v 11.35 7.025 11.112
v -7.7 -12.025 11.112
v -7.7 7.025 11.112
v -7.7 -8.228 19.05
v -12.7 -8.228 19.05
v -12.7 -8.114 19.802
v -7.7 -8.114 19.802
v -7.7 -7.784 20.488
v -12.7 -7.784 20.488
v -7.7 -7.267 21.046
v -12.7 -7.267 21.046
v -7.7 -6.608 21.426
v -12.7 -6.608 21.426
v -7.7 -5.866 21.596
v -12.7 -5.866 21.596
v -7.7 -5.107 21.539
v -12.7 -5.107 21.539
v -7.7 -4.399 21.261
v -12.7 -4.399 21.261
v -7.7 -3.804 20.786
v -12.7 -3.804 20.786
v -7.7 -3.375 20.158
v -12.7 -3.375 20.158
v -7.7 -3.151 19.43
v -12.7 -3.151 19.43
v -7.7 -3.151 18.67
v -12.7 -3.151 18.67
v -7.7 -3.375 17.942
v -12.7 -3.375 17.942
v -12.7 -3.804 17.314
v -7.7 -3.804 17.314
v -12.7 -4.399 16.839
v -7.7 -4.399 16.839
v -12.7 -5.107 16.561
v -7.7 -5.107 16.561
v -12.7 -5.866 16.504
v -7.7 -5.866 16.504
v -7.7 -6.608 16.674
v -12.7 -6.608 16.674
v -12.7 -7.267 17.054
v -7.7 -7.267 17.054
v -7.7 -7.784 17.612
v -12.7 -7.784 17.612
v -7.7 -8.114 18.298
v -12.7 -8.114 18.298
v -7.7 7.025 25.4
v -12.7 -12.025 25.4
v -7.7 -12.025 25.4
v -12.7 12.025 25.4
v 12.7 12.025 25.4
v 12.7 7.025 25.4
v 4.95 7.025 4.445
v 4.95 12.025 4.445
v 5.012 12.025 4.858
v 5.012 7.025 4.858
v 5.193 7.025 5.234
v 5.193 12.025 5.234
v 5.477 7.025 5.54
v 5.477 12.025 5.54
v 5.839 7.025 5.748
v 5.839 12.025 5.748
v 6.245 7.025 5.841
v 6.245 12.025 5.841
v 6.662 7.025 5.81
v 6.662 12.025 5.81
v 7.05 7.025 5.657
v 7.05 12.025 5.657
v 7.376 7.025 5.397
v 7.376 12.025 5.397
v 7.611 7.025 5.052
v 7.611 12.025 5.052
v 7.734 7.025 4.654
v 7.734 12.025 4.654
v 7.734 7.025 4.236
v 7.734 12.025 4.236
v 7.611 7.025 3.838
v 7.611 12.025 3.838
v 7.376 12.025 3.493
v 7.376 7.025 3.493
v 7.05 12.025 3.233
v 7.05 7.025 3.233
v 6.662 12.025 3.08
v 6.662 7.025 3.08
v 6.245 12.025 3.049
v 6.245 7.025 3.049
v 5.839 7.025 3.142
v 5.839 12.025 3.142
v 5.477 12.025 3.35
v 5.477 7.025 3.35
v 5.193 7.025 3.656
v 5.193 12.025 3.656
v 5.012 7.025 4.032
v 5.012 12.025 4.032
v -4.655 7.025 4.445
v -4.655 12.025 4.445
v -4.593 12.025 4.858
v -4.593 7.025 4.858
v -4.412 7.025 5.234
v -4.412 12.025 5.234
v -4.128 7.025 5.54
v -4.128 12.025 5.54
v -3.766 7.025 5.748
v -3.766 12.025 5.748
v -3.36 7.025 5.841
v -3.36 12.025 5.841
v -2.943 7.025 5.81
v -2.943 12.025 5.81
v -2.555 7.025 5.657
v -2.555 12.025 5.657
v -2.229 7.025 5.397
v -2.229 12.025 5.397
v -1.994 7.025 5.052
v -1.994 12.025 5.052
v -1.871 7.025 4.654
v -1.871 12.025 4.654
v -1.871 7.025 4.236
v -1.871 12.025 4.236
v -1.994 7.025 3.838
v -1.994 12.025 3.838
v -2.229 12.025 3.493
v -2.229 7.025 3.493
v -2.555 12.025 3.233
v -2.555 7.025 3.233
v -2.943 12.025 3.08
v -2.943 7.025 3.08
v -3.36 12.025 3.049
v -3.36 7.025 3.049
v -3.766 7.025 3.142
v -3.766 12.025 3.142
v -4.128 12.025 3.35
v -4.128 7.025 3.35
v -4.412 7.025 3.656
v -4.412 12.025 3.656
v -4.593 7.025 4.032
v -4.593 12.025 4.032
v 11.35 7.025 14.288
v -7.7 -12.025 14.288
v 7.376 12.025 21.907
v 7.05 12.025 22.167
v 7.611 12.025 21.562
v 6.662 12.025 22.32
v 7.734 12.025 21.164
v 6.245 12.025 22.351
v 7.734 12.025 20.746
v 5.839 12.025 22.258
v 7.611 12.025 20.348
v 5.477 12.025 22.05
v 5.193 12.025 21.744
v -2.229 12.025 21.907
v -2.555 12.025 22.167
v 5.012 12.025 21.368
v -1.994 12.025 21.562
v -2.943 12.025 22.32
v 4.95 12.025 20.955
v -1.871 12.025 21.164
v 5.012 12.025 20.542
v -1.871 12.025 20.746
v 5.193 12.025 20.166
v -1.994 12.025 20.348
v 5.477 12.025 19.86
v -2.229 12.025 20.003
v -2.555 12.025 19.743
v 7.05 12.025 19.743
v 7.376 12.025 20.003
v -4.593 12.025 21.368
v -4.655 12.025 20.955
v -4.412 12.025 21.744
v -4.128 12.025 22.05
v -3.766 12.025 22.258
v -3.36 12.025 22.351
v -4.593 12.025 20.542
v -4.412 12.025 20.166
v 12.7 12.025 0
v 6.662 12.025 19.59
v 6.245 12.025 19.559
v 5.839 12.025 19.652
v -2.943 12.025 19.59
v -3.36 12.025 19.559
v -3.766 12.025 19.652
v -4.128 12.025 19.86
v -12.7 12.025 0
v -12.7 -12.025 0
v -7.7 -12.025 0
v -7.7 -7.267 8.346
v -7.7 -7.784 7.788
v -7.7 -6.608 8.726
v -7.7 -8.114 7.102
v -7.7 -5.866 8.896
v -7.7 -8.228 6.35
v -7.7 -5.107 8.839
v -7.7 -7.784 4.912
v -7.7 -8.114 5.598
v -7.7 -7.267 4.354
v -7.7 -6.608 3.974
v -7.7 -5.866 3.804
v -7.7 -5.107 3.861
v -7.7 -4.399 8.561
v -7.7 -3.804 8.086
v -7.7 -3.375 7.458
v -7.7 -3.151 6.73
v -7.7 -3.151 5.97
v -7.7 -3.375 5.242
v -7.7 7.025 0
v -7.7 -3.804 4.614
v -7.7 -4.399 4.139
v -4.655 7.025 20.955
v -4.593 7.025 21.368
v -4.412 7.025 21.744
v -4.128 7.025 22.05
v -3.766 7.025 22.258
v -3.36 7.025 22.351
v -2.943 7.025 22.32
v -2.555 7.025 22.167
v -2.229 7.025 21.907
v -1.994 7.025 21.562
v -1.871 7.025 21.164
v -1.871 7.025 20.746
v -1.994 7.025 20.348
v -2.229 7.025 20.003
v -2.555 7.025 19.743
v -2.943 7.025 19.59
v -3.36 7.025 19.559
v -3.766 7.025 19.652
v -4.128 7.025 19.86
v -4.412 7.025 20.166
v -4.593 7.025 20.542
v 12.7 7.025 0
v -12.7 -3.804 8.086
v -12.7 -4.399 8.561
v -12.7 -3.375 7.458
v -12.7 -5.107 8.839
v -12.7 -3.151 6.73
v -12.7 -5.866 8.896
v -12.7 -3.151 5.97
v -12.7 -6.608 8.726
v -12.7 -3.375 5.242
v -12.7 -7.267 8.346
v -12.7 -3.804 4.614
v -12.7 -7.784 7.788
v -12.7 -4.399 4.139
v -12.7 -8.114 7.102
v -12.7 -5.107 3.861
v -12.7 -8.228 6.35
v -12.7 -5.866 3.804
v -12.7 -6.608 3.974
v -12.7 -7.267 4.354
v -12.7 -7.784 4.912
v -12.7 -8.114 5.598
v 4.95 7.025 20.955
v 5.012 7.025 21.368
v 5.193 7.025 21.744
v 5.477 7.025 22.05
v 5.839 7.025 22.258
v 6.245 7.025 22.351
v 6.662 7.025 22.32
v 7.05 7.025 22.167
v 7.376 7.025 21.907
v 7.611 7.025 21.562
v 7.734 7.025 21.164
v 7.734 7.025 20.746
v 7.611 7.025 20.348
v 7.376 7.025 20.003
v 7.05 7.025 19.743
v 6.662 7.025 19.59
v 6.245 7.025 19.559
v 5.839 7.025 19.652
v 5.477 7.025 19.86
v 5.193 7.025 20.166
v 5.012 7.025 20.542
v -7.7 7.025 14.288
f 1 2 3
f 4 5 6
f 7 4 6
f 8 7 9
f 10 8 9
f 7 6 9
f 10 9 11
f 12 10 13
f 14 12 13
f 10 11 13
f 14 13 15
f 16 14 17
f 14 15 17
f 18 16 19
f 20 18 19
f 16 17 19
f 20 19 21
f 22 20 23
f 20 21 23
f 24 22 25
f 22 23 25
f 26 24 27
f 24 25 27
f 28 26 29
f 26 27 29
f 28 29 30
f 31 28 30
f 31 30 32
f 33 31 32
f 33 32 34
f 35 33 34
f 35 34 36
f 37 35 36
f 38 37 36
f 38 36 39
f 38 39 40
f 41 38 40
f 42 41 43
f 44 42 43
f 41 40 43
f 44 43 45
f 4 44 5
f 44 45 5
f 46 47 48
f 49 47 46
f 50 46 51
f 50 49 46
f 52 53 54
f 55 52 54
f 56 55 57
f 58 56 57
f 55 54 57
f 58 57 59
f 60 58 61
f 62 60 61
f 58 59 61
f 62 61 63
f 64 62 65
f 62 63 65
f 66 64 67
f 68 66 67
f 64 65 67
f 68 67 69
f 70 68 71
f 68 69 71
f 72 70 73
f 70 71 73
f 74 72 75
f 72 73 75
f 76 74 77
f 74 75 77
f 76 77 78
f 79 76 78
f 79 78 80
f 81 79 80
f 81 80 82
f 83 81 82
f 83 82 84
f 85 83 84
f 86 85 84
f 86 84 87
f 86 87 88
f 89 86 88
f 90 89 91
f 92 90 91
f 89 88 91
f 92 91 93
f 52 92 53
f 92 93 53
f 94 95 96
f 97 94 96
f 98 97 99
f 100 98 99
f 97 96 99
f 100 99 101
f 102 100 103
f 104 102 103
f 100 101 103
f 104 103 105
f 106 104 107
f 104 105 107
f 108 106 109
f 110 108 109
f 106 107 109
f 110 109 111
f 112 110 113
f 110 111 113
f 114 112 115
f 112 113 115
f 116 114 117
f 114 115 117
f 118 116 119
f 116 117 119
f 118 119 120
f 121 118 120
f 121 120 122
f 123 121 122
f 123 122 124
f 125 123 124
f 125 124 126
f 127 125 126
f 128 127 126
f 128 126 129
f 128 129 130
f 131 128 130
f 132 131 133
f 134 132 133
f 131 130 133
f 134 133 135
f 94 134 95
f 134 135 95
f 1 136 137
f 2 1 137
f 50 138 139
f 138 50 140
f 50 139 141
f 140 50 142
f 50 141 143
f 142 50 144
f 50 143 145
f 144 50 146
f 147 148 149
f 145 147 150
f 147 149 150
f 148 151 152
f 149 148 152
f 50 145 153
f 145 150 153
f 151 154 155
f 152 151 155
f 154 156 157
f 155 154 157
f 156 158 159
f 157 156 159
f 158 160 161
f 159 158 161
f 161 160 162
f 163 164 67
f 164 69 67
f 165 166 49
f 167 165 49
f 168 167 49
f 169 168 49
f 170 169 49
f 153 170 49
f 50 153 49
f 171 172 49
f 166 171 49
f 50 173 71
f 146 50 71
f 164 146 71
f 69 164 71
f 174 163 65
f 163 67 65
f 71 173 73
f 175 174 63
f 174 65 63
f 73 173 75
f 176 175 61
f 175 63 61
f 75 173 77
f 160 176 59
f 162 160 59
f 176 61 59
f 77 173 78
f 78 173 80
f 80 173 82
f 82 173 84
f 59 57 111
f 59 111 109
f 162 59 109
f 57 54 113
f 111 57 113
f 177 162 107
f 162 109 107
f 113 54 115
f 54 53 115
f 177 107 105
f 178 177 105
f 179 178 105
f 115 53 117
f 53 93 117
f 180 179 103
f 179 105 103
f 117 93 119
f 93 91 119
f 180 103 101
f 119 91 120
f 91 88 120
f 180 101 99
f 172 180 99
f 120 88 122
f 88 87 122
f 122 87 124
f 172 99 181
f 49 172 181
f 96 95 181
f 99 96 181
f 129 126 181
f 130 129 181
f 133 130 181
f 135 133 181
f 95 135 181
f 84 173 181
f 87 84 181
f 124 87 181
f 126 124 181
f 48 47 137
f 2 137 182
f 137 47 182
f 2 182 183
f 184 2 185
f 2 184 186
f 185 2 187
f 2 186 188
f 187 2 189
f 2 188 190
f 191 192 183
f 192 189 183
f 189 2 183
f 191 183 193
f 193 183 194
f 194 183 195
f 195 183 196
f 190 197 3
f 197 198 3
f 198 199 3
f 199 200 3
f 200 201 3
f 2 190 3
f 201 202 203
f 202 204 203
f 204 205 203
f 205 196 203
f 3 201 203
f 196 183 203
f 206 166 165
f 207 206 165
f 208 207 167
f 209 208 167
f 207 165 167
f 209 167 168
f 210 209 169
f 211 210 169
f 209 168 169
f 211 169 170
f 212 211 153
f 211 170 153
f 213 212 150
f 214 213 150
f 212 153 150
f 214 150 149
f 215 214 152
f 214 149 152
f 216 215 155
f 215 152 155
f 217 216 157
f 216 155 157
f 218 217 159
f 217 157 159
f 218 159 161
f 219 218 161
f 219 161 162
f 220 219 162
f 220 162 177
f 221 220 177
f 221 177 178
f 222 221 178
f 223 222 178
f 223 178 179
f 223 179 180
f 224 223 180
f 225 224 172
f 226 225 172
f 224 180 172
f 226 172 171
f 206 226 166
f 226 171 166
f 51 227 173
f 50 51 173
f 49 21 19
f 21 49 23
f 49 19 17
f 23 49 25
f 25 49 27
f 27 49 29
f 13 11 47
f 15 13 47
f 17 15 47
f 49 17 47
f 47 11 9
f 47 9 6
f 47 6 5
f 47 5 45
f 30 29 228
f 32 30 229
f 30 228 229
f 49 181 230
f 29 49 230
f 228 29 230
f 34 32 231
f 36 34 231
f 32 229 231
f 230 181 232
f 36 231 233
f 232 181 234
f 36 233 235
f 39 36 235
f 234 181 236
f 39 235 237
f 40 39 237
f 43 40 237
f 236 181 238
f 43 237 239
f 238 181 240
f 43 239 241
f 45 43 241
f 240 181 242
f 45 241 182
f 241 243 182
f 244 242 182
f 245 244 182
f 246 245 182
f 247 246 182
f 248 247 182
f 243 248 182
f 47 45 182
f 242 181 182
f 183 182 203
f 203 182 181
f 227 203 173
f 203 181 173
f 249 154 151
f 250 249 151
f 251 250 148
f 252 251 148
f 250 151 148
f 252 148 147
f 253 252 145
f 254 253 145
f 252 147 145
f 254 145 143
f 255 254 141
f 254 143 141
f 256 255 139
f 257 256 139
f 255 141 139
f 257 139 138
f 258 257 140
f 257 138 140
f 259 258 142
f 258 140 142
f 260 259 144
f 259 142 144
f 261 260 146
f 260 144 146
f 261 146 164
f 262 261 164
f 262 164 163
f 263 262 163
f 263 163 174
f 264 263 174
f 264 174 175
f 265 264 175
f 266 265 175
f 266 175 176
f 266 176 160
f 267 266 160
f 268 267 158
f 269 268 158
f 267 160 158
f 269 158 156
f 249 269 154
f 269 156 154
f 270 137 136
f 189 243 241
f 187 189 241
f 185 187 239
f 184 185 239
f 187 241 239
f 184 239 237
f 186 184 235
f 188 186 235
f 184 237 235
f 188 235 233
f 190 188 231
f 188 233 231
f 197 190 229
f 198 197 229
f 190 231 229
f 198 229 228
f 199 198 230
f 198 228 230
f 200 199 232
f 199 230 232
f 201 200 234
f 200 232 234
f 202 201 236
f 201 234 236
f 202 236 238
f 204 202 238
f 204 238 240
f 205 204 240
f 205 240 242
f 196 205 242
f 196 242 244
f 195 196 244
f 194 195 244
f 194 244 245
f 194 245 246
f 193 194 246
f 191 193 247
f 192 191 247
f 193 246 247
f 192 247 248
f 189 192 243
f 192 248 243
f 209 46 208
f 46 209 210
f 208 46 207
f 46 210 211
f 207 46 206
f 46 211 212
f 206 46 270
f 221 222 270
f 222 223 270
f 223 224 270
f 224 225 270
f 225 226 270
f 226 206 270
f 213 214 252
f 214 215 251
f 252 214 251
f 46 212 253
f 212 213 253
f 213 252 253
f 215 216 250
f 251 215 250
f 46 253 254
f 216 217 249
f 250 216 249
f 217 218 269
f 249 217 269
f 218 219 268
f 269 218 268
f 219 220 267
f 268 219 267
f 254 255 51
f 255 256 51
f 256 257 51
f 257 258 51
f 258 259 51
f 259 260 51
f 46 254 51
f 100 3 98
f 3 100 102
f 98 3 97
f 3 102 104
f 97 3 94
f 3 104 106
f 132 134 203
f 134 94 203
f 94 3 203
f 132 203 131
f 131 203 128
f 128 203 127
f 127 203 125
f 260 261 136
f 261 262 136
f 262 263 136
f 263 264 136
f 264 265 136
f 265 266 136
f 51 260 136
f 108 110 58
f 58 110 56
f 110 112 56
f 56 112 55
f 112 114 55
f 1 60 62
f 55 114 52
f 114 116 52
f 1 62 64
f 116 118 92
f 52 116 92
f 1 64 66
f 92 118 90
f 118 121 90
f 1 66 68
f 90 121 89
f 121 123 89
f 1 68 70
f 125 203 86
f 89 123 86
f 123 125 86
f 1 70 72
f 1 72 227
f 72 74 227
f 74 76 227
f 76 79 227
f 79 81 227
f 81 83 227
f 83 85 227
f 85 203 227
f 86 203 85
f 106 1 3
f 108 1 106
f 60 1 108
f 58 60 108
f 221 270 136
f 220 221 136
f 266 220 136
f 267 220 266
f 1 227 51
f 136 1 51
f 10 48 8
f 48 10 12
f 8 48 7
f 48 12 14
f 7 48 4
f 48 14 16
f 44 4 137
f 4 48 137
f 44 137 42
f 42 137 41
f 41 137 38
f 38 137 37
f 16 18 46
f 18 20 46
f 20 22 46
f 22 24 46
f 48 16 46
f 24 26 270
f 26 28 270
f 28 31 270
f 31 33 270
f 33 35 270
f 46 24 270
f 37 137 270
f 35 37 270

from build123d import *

# Parameters (mm, degrees)
F1_DEPTH = 25.4
F2_W     = 19.05
F2_H     = 1.5875
F3_DEPTH = 20.4
F5_DEPTH = 3.175
F6_R     = 1.4
F7_DEPTH = 5
F8_R     = 2.5527
F9_DEPTH = 5


with BuildPart() as f1:
    # F0 (on Top) → F1 (new body)
    with BuildSketch(Plane.XY):
        Polygon((-12.7, -12.025), (-7.7, -12.025), (-7.7, 7.025), (12.7, 7.025), (12.7, 12.025), (-12.7, 12.025), align=None)
    extrude(amount=F1_DEPTH)

    # F2 (on face) → F3 (join)
    with BuildSketch(Plane.YZ.offset(-7.7)):
        with Locations((-2.5, 13.49375)):
            Rectangle(F2_W, F2_H)
        with Locations((-2.5, 11.90625)):
            Rectangle(F2_W, F2_H)
    extrude(amount=F3_DEPTH)

    # F4 (on face) → F5 (cut, through all)
    with BuildSketch(Plane.XY.offset(14.2875)):
        Polygon((-7.7, -12.025), (12.7, -12.025), (12.7, 7.025), (11.35, 7.025), align=None)
    extrude(amount=-F5_DEPTH, mode=Mode.SUBTRACT)

    # F6 (on face) → F7 (cut, through all)
    with BuildSketch(Plane(origin=(0, 12.025, 0), x_dir=(-1, 0, 0), z_dir=(0, 1, 0))):
        with Locations((-6.35, 4.445)):
            Circle(F6_R)
        with Locations((-6.35, 20.955)):
            Circle(F6_R)
        with Locations((3.255, 20.955)):
            Circle(F6_R)
        with Locations((3.255, 4.445)):
            Circle(F6_R)
    extrude(amount=-F7_DEPTH, mode=Mode.SUBTRACT)

    # F8 (on face) → F9 (cut, through all)
    with BuildSketch(Plane(origin=(-12.7, 0, 0), x_dir=(0, -1, 0), z_dir=(-1, 0, 0))):
        with Locations((5.675, 19.05)):
            Circle(F8_R)
        with Locations((5.675, 6.35)):
            Circle(F8_R)
    extrude(amount=-F9_DEPTH, mode=Mode.SUBTRACT)


solid = f1.part
